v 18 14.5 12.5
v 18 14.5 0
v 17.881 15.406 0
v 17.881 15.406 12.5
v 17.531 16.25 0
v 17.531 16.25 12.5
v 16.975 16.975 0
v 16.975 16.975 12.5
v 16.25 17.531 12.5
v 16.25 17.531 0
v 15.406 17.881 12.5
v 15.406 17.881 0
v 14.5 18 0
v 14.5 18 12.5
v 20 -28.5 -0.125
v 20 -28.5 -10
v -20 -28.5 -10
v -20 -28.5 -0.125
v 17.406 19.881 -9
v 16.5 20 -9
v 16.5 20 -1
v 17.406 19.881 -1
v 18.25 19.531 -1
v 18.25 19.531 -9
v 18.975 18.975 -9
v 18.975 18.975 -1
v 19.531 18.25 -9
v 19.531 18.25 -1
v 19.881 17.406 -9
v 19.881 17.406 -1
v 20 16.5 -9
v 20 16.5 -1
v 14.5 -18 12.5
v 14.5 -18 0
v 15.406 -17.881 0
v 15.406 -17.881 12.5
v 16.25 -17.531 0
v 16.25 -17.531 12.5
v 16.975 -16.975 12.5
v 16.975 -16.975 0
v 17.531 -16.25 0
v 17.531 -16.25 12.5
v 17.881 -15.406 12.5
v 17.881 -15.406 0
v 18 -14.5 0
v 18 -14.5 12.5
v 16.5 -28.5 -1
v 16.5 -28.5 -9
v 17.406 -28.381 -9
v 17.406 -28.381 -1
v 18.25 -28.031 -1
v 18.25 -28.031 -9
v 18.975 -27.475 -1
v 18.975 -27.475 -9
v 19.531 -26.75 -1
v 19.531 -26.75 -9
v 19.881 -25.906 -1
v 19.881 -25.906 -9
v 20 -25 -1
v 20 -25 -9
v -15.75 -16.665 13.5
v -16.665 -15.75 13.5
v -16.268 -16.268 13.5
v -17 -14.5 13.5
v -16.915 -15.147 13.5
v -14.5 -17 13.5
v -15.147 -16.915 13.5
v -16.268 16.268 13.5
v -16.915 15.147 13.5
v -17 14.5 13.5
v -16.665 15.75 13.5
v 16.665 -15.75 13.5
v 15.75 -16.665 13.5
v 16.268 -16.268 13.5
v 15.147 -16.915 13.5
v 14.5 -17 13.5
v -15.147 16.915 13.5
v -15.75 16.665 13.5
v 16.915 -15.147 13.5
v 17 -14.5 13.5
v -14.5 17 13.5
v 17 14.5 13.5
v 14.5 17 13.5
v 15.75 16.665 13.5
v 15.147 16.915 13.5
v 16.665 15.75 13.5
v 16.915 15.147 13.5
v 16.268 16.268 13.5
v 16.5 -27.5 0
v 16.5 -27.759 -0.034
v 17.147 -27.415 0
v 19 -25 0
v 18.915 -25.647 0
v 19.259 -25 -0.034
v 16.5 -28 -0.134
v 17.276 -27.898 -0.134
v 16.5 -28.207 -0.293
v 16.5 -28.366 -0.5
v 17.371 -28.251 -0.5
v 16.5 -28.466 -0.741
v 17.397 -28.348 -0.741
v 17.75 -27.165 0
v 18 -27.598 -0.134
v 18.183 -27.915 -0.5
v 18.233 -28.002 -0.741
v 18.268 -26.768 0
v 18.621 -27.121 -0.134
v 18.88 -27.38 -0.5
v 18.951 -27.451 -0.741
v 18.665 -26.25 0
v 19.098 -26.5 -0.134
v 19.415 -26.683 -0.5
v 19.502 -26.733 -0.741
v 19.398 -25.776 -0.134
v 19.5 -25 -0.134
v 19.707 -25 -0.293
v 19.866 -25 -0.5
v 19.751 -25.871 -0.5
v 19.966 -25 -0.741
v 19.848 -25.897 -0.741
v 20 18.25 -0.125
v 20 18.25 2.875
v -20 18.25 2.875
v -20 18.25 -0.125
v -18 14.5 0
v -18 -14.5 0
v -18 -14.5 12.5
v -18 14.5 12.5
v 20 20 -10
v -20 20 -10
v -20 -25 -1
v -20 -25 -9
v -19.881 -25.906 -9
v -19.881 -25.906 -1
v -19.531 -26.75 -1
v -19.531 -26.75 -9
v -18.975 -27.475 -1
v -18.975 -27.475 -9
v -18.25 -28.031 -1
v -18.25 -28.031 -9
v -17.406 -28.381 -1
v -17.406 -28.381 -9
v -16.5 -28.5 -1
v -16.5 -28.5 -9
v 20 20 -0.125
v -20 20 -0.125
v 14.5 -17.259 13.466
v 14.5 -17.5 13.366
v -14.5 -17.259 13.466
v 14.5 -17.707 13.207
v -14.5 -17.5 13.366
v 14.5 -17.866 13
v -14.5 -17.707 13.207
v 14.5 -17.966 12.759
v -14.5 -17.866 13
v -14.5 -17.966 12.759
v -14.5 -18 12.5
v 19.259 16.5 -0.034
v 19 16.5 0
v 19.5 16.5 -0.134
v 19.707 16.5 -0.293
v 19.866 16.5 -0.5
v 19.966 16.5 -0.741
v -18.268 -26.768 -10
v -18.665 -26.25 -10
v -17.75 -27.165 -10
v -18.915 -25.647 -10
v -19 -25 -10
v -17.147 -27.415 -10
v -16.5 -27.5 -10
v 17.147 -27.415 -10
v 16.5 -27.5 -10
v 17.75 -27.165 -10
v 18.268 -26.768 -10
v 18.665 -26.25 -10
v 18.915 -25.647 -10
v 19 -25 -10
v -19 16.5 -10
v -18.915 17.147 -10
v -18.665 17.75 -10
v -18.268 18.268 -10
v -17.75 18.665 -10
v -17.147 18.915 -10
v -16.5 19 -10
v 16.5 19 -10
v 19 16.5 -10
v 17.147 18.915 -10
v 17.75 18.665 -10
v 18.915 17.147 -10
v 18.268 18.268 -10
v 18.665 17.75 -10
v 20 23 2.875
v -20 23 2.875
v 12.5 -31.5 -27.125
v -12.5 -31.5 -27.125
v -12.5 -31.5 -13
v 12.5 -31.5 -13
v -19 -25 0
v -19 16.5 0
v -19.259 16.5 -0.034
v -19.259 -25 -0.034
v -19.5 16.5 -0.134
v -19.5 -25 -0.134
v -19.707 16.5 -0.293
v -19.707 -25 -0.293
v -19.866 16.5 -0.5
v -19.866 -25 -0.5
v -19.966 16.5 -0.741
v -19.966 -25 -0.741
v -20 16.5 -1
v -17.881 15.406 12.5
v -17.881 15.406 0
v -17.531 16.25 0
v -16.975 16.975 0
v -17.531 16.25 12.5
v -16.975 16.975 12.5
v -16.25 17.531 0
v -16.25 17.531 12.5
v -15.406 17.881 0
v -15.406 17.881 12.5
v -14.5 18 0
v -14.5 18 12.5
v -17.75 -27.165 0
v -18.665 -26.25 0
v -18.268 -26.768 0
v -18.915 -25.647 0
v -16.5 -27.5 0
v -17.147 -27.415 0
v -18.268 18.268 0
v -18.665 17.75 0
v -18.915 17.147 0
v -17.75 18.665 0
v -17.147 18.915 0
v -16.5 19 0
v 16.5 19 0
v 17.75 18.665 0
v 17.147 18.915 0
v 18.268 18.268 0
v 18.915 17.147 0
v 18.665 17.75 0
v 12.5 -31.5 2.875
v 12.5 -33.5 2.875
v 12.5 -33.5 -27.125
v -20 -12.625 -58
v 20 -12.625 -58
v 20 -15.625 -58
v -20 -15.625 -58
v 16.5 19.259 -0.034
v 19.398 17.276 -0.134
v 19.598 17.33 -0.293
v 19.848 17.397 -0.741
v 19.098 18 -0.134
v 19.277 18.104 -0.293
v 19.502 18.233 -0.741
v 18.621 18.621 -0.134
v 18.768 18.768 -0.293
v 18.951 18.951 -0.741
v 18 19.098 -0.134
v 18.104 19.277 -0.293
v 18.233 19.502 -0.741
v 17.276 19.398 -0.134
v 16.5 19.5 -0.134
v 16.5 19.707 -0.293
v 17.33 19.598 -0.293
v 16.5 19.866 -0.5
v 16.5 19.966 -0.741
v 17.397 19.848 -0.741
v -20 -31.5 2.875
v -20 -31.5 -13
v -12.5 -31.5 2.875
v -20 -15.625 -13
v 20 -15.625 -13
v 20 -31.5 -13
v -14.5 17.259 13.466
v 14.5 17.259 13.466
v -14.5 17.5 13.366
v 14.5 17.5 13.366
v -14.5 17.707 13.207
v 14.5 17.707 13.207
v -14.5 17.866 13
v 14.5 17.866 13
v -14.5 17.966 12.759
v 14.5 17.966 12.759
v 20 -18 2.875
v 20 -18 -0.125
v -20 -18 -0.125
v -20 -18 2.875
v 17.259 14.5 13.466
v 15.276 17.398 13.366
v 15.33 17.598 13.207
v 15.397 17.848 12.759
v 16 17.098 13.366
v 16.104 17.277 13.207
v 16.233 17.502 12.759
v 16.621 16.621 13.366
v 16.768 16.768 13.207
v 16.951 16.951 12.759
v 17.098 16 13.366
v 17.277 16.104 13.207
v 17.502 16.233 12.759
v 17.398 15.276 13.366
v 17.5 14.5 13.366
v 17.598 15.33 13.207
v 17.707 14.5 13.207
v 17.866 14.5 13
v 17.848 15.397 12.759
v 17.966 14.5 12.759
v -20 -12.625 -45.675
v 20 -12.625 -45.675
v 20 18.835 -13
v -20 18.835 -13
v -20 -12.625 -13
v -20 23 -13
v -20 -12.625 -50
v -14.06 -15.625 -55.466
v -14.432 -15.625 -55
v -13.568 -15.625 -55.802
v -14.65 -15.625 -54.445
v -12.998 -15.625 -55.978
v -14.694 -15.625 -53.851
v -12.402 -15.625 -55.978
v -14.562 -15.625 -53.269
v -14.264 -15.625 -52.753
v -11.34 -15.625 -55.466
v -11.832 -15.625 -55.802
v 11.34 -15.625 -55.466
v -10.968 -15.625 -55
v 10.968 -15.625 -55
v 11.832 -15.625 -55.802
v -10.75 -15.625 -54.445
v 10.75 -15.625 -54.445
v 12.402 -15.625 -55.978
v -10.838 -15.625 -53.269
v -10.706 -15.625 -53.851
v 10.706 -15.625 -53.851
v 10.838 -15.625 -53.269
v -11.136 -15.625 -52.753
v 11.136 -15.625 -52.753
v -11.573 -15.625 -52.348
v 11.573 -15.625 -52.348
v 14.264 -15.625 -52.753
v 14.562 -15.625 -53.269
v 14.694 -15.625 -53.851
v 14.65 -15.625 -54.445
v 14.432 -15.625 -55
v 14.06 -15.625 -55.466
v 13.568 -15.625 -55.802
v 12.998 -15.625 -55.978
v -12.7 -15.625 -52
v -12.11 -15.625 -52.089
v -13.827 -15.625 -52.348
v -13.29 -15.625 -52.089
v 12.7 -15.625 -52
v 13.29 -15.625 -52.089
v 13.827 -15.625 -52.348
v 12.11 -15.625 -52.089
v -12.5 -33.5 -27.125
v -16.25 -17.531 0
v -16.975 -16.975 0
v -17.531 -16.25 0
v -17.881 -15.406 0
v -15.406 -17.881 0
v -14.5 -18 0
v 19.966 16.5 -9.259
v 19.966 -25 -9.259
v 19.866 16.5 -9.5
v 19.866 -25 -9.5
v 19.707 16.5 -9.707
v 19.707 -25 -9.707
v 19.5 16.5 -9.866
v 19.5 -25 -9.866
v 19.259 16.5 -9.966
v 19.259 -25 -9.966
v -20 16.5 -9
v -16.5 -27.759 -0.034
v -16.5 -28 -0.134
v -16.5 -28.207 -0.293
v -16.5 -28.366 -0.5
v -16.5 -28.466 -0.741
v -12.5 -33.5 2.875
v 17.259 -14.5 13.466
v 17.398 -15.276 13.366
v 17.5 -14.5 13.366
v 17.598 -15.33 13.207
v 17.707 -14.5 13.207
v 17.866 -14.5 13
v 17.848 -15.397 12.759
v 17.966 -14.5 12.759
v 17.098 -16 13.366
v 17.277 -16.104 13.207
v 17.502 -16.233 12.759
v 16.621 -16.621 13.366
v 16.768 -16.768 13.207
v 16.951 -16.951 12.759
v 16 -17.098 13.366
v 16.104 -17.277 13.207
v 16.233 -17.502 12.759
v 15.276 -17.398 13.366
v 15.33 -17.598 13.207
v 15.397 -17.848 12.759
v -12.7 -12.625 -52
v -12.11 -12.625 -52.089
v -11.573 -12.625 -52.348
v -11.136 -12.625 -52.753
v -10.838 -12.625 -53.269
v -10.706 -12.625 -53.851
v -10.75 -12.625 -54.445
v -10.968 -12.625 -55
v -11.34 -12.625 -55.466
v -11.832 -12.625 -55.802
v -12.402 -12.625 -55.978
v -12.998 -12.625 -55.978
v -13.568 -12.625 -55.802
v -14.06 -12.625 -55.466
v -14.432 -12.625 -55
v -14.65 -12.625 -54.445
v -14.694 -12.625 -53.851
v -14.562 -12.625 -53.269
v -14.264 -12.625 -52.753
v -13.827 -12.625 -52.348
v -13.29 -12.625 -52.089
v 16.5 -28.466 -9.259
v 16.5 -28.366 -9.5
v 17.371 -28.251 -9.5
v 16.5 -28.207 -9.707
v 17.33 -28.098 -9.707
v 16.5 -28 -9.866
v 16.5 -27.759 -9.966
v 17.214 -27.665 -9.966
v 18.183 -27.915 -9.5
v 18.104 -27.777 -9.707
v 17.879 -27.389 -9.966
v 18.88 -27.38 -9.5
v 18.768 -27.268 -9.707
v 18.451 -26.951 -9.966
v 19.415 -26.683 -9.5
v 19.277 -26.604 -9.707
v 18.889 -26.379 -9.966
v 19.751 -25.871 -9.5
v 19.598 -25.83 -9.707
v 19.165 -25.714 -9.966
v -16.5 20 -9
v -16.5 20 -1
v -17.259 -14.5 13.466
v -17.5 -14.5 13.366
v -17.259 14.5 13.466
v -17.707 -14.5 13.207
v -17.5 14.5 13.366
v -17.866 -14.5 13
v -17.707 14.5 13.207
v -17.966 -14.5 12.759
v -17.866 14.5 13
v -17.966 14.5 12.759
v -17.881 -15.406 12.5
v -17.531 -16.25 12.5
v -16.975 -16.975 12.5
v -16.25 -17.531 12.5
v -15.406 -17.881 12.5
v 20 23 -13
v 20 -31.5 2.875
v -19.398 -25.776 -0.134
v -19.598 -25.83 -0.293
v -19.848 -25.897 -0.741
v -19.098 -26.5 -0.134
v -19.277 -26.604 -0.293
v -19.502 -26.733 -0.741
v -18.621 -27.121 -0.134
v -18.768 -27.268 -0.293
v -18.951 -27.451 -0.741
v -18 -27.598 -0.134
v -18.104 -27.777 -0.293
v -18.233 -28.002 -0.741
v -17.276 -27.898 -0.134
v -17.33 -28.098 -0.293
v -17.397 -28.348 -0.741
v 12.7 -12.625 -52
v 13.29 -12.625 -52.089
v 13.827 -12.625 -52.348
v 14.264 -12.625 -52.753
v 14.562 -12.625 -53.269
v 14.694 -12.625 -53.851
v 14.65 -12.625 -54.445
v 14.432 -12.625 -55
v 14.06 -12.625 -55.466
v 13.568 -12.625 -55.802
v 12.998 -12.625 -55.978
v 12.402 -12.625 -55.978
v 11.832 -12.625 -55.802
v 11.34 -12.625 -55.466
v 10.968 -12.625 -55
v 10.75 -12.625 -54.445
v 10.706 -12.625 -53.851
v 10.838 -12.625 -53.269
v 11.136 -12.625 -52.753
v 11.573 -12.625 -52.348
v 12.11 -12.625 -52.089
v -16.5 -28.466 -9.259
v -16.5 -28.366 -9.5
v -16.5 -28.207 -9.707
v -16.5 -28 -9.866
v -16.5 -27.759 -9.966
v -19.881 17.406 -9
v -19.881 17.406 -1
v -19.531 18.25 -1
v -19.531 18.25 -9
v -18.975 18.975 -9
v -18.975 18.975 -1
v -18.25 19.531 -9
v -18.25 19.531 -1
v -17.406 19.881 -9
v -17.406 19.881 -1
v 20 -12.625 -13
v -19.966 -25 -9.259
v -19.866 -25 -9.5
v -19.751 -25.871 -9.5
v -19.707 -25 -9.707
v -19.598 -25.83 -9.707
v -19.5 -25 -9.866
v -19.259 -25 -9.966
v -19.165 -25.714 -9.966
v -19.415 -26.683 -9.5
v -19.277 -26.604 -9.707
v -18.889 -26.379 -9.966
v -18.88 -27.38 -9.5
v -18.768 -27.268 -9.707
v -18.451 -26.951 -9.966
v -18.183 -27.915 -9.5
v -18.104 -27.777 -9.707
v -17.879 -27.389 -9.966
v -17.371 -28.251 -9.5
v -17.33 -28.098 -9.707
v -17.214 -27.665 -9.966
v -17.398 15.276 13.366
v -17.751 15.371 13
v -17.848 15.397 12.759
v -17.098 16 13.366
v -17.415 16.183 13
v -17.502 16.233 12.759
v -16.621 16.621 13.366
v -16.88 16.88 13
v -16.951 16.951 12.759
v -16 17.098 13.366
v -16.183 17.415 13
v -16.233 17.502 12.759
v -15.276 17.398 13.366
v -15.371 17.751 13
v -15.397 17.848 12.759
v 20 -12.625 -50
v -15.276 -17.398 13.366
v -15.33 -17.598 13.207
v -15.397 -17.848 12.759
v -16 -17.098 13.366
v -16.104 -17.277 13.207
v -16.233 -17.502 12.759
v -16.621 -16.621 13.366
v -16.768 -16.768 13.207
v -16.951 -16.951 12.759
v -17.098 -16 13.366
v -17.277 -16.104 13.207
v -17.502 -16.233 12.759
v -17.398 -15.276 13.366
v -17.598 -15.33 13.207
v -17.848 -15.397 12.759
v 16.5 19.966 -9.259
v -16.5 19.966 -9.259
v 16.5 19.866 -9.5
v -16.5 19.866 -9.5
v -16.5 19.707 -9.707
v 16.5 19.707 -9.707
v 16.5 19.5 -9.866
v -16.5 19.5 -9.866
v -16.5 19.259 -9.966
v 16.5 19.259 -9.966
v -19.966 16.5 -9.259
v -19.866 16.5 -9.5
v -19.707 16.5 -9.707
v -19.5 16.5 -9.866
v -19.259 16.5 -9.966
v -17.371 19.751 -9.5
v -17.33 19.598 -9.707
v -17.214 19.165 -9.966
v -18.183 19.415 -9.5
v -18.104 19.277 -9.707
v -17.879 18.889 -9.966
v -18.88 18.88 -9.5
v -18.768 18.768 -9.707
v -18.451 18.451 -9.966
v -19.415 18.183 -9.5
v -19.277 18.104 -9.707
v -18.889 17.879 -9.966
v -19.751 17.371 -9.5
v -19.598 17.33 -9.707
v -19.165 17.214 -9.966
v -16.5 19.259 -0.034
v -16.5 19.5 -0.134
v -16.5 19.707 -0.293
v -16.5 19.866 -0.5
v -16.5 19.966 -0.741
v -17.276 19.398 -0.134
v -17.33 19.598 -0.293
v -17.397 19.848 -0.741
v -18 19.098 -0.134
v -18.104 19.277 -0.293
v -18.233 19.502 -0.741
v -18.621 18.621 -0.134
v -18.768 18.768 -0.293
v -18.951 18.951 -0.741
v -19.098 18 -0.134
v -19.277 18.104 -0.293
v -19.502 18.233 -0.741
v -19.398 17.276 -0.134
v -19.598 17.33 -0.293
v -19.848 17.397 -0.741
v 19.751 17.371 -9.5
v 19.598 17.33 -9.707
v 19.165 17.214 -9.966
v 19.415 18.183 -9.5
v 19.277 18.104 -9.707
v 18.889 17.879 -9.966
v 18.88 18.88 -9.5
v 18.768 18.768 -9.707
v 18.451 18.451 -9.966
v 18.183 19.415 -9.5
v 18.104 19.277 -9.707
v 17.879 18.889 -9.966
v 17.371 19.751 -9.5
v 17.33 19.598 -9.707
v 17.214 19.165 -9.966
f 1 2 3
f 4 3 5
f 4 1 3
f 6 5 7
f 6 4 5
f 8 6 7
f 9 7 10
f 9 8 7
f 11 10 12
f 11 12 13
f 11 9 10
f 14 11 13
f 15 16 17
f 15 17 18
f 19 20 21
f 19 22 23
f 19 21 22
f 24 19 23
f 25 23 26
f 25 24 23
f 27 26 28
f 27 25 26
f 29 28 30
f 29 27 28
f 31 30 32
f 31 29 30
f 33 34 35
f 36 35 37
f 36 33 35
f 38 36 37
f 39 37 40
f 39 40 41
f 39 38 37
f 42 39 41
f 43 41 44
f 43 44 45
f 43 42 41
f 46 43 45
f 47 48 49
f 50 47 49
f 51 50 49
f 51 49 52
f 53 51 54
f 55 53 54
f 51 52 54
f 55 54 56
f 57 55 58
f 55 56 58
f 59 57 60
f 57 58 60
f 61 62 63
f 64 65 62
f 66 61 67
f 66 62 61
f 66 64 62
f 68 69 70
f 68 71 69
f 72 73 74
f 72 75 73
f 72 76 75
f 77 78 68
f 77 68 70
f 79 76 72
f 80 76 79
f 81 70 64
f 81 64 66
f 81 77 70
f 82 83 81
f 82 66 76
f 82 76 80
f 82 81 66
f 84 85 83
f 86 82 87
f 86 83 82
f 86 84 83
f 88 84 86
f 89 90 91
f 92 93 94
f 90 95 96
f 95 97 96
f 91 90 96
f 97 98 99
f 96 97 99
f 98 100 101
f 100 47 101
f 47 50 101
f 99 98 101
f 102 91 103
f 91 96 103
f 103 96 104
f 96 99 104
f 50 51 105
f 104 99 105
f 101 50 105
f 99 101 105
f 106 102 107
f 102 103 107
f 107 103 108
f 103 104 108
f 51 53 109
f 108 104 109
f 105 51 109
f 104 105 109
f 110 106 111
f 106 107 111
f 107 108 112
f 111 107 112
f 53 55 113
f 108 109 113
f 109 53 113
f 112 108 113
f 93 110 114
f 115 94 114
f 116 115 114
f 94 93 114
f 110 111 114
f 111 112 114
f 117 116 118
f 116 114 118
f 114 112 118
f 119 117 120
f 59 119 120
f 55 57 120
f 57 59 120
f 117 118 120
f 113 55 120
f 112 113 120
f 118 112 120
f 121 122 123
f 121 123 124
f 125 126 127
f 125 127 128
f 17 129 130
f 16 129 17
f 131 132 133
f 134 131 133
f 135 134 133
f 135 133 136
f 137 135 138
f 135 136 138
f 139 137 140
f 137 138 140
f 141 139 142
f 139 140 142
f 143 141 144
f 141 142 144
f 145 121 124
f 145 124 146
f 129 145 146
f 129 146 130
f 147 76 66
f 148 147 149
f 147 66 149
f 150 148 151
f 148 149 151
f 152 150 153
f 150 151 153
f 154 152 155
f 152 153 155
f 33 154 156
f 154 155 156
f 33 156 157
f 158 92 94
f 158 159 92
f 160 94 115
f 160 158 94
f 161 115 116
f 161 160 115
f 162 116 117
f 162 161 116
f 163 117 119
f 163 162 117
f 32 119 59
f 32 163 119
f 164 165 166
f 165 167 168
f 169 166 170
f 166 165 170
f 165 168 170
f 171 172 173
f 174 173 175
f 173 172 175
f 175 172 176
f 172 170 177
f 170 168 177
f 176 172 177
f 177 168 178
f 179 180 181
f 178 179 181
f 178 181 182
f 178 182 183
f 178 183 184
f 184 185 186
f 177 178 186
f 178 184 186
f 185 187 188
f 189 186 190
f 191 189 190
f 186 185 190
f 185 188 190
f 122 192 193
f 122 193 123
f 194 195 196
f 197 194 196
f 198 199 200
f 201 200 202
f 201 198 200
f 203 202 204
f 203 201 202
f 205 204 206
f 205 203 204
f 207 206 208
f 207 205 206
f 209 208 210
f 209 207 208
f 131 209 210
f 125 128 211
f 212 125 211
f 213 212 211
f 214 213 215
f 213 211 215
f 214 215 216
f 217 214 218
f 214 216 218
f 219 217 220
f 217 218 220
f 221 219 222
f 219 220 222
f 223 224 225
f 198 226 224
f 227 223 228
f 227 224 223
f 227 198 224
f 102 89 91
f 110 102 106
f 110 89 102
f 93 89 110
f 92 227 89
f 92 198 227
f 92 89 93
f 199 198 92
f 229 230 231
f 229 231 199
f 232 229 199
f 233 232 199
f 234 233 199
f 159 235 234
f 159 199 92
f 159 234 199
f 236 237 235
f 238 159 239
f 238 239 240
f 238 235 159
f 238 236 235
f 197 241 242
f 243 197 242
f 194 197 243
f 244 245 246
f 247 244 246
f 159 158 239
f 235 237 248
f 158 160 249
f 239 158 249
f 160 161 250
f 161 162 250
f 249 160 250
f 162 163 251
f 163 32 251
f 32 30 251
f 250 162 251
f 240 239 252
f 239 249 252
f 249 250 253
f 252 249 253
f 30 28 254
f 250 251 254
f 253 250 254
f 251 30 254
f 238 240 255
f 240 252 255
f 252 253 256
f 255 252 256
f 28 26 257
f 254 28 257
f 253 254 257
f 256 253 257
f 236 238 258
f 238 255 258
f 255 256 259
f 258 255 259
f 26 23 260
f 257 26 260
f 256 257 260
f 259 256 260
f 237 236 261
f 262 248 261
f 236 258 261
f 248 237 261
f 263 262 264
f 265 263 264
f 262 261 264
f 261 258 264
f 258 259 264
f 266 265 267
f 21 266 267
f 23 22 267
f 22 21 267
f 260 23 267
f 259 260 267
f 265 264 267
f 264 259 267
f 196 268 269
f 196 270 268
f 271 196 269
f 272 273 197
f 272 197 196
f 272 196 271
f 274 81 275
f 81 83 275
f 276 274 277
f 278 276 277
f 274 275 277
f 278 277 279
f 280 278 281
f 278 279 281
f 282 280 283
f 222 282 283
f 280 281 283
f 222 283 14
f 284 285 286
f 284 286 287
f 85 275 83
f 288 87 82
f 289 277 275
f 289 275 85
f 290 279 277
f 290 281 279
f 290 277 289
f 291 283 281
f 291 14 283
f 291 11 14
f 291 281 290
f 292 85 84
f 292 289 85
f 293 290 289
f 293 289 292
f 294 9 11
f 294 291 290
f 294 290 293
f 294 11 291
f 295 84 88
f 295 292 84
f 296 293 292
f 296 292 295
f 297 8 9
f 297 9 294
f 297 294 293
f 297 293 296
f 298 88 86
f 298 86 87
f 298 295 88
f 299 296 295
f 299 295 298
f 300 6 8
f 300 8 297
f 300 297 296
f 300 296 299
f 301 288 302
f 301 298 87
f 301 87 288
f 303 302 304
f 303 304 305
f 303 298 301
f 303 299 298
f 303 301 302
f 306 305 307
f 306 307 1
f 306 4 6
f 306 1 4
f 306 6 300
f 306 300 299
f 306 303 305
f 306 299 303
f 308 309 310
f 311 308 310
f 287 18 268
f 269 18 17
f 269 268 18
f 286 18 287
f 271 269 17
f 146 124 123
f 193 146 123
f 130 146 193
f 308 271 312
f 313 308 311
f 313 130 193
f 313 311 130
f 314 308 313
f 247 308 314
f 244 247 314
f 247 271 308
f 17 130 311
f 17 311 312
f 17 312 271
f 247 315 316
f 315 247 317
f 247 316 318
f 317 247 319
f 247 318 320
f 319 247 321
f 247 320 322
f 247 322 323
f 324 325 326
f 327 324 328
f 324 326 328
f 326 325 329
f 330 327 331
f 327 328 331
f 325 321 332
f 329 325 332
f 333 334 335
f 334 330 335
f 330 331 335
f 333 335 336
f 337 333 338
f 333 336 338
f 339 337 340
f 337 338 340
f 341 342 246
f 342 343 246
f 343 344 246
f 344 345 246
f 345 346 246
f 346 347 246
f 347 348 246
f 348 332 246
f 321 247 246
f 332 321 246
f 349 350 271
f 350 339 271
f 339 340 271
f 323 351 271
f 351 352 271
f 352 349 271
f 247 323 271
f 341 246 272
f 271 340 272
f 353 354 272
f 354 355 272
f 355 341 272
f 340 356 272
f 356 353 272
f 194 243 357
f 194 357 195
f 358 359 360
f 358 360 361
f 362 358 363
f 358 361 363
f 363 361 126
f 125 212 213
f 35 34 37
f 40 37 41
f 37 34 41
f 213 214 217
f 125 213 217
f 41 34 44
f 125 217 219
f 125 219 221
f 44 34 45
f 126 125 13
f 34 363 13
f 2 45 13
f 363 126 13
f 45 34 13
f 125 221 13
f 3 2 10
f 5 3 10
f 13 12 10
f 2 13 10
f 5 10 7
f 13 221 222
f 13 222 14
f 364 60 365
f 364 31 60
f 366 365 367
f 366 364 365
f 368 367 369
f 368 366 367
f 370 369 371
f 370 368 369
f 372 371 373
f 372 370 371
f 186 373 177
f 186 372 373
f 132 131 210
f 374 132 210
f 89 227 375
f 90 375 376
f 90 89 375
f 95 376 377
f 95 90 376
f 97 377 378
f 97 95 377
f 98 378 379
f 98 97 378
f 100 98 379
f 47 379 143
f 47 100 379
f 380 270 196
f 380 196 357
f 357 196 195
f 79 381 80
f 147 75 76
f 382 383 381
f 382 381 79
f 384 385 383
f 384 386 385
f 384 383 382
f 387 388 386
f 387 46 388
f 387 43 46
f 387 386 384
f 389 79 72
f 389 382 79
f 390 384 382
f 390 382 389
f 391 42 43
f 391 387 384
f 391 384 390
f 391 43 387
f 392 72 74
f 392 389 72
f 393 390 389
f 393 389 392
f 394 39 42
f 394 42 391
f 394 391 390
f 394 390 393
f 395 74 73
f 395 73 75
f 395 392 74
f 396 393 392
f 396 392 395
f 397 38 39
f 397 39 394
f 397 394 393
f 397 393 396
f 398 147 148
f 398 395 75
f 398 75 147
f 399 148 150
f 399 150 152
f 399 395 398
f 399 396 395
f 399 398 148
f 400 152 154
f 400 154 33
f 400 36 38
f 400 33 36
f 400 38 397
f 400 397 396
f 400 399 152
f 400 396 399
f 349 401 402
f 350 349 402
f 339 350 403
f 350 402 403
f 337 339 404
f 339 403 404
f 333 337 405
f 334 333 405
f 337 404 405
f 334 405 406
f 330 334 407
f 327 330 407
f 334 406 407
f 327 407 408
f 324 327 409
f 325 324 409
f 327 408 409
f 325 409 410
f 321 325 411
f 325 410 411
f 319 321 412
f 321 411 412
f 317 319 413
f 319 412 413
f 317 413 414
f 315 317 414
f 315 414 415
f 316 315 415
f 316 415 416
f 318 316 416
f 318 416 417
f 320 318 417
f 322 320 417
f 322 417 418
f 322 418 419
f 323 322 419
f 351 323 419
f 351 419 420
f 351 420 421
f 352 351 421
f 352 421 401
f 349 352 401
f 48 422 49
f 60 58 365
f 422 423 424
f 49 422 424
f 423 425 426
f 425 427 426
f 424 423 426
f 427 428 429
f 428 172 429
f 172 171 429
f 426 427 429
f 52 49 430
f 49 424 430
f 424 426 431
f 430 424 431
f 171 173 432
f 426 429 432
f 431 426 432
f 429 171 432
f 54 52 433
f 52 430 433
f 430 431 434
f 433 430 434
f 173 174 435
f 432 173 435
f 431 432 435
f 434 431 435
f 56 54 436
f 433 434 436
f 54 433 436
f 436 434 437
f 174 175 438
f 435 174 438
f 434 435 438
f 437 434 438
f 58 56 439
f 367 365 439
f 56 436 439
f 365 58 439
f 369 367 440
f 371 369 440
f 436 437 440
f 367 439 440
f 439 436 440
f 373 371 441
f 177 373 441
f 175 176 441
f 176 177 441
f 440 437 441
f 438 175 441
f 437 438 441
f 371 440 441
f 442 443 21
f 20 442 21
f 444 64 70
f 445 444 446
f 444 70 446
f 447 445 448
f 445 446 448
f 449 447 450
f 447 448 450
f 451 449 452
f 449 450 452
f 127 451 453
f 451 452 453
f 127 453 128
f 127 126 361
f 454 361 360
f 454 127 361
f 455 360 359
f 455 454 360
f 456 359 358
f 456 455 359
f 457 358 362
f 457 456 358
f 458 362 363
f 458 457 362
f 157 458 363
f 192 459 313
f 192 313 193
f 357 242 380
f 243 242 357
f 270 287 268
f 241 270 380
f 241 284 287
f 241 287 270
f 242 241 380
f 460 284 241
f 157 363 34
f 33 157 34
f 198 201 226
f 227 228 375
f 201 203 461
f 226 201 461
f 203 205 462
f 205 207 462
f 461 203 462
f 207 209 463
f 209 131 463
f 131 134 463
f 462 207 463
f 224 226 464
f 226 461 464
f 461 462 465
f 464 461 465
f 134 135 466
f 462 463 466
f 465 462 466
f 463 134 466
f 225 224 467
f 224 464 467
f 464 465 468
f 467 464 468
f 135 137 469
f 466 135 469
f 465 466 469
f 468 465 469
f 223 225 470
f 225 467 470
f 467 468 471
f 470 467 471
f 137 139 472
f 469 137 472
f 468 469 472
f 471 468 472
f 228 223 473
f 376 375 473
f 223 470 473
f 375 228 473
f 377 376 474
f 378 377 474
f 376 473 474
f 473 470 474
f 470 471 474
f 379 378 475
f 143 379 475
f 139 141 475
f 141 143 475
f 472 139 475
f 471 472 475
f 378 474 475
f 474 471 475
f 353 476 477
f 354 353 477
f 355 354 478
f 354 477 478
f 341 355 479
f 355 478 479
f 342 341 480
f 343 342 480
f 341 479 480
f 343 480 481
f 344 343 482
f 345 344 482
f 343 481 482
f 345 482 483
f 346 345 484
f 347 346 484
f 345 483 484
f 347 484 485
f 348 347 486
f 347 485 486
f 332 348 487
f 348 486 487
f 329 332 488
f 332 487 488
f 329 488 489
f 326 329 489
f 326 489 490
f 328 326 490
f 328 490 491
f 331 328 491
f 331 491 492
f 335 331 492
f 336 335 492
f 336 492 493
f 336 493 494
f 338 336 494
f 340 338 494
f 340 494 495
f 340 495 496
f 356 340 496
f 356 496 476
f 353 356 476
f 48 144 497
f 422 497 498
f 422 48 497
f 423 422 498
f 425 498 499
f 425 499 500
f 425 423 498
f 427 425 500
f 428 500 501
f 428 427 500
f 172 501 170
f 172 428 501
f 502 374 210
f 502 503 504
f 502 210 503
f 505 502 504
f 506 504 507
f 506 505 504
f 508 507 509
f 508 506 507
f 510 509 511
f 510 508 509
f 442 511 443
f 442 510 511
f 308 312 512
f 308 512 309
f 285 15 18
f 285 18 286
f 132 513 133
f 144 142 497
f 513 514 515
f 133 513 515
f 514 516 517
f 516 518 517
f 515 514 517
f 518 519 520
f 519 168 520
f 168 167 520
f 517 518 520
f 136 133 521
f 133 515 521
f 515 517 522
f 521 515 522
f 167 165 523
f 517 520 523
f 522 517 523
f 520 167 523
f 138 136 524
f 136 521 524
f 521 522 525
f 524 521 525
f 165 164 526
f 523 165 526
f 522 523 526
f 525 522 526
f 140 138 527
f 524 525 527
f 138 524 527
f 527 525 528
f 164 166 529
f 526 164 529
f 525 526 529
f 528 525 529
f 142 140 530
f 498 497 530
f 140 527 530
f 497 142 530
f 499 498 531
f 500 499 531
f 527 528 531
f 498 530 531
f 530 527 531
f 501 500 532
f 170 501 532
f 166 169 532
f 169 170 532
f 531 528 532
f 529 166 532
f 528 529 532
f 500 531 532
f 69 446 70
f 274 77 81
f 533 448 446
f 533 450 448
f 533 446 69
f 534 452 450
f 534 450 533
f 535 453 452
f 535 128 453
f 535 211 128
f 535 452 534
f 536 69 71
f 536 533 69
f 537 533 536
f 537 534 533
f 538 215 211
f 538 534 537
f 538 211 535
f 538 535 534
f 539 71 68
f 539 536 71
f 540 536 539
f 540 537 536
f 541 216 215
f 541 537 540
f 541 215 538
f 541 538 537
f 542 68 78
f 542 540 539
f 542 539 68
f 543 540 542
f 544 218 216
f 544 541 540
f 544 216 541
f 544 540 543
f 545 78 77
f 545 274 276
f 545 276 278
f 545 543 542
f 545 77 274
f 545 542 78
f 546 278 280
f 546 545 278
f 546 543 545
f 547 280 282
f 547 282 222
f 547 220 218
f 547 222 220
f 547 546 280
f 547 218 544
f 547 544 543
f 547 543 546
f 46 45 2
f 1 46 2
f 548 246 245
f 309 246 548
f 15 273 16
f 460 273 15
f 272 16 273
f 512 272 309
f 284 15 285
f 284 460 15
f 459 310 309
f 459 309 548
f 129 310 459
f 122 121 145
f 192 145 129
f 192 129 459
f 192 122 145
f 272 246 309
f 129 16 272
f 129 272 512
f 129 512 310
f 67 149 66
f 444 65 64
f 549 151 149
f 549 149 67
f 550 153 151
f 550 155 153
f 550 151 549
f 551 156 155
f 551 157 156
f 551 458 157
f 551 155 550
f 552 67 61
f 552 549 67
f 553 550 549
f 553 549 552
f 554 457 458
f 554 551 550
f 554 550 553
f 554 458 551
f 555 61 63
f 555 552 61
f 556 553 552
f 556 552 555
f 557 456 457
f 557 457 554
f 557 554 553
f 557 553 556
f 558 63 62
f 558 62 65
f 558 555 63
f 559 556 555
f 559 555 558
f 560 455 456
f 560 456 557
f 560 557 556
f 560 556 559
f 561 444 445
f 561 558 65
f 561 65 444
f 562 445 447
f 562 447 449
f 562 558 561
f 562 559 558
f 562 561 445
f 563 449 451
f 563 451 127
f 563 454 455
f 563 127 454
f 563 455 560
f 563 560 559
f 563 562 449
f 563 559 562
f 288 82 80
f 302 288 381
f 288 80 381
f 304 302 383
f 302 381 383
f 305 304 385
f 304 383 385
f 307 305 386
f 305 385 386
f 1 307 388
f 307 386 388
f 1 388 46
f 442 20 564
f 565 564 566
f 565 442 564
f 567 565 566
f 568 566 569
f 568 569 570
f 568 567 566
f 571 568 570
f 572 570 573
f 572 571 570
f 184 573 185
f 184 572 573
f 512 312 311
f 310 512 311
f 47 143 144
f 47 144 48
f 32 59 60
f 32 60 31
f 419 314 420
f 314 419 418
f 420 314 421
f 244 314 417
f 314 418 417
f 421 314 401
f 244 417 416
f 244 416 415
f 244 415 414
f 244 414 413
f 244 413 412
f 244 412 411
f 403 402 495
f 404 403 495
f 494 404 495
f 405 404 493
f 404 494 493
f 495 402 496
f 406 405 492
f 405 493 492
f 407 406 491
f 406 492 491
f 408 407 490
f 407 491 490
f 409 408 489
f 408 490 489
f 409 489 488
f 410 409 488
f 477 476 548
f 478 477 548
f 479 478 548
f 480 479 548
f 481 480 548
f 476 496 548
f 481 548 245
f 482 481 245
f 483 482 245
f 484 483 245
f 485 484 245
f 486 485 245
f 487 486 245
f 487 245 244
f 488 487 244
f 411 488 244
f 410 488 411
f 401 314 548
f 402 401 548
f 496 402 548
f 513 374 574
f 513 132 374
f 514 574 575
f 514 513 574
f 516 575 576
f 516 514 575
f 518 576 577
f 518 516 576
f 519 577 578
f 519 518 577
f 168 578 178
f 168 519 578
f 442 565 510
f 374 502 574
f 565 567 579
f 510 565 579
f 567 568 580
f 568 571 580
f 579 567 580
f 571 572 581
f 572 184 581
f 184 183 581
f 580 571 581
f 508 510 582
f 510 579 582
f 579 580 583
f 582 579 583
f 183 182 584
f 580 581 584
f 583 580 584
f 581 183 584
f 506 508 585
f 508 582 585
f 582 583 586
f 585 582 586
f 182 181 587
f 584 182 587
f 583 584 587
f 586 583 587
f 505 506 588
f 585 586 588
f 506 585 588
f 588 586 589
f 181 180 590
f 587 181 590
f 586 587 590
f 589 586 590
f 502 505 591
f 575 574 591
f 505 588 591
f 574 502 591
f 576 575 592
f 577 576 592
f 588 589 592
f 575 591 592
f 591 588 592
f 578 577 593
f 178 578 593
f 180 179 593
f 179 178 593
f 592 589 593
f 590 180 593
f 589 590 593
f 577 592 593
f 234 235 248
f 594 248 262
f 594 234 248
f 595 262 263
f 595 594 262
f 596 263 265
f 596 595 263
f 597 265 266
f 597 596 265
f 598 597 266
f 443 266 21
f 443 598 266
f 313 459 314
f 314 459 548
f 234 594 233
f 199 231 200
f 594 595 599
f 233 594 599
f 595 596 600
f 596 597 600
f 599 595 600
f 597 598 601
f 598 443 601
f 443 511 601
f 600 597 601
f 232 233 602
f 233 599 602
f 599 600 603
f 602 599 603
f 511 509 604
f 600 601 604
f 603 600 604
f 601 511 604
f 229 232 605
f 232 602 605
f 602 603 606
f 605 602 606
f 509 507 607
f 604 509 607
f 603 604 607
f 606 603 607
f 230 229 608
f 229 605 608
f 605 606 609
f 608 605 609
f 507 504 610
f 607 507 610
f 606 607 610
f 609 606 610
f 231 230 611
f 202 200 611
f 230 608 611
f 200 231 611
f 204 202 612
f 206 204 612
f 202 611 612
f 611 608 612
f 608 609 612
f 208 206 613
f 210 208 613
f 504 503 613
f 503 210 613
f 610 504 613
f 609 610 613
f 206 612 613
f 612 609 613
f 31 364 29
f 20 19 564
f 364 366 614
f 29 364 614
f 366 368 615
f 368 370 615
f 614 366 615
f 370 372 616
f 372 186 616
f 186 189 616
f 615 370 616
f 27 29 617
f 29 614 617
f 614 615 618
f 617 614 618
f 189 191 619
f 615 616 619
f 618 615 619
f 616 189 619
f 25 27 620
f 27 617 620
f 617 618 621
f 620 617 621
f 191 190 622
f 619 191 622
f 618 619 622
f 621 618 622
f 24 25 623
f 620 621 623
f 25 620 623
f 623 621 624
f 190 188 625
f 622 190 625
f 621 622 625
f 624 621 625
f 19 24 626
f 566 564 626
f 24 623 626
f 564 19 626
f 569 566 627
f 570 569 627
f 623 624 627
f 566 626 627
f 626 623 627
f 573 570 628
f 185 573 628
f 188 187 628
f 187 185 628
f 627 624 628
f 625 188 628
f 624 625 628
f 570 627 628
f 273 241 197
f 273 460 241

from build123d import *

# Parameters (mm, degrees)
SKETCH1_W                       = 36
SKETCH1_H                       = 36
BOSS_EXTRUDE1_DEPTH             = 13.5
SKETCH1_3_W                     = 40
SKETCH1_3_H                     = 48.5
SKETCH1_3_W_2                   = 36
SKETCH1_3_H_2                   = 36
BOSS_EXTRUDE2_DEPTH             = 10
FILLET1_R                       = 3.5
FILLET2_R                       = 3.5
FILLET3_R                       = 1
FILLET4_R                       = 1
FILLET5_R                       = 1
BOSS_EXTRUDE3_REACH             = 39.343
BOSS_EXTRUDE3_DIRECTION_2_REACH = 39.343
BOSS_EXTRUDE4_REACH             = 41.68
BOSS_EXTRUDE4_DIRECTION_2_REACH = 41.68
BOSS_EXTRUDE5_DEPTH             = 12.5
SKETCH9_R                       = 2
CUT_EXTRUDE3_DEPTH              = 71.944630699


with BuildPart() as part:
    # Sketch1 → Boss-Extrude1 (new body)
    with BuildSketch(Plane.XY):
        Rectangle(SKETCH1_W, SKETCH1_H)
    extrude(amount=BOSS_EXTRUDE1_DEPTH)

    # Fillet2
    fillet2_edges = [part.edges().sort_by_distance(p)[0] for p in [
        (-18, 18, 6.75),
        (-18, -18, 6.75),
        (18, -18, 6.75),
        (18, 18, 6.75),
    ]]
    fillet(fillet2_edges, radius=FILLET2_R)

    # Fillet5
    fillet5_edges = [part.edges().sort_by_distance(p)[0] for p in [
        (0, 18, 13.5),
        (18, 0, 13.5),
        (-18, 0, 13.5),
        (0, -18, 13.5),
        (-16.974873734, 16.974873734, 13.5),
        (-16.974873734, -16.974873734, 13.5),
        (16.974873734, -16.974873734, 13.5),
        (16.974873734, 16.974873734, 13.5),
    ]]
    fillet(fillet5_edges, radius=FILLET5_R)


with BuildPart() as body_2:
    # Sketch1<3> → Boss-Extrude2 (new body)
    # profile 1 of 2: a face of its own
    with BuildSketch(Plane.XY):
        with Locations((0, -4.25)):
            Rectangle(SKETCH1_3_W, SKETCH1_3_H)
        Rectangle(SKETCH1_3_W_2, SKETCH1_3_H_2, mode=Mode.SUBTRACT)
    # profile 2 of 2: a face of its own
    with BuildSketch(Plane.XY):
        Rectangle(SKETCH1_3_W_2, SKETCH1_3_H_2)
    extrude(amount=-BOSS_EXTRUDE2_DEPTH)

    # Fillet1
    fillet1_edges = [body_2.edges().sort_by_distance(p)[0] for p in [
        (20, -28.5, -5),
        (-20, -28.5, -5),
        (-20, 20, -5),
        (20, 20, -5),
    ]]
    fillet(fillet1_edges, radius=FILLET1_R)

    # Fillet3
    fillet3_edges = [body_2.edges().sort_by_distance(p)[0] for p in [
        (20, -4.25, 0),
        (0, 20, 0),
        (-20, -4.25, 0),
        (0, -28.5, 0),
        (-18.974873734, 18.974873734, 0),
        (18.974873734, -27.474873734, 0),
        (-18.974873734, -27.474873734, 0),
        (18.974873734, 18.974873734, 0),
    ]]
    fillet(fillet3_edges, radius=FILLET3_R)

    # Fillet4
    fillet4_edges = [body_2.edges().sort_by_distance(p)[0] for p in [
        (20, -4.25, -10),
        (0, 20, -10),
        (0, -28.5, -10),
        (-20, -4.25, -10),
        (-18.974873734, 18.974873734, -10),
        (18.974873734, -27.474873734, -10),
        (-18.974873734, -27.474873734, -10),
        (18.974873734, 18.974873734, -10),
    ]]
    fillet(fillet4_edges, radius=FILLET4_R)


with BuildPart() as body_3:

    # Boss-Extrude3: up to this face of the body (flat: up to its plane)
    boss_extrude3_end = Plane(body_2.part.faces().sort_by_distance((20, -4.25, -5))[0])
    # Sketch2 → Boss-Extrude3 (new, up to the picked face)
    with BuildSketch(Plane(origin=(0, 0, 0), x_dir=(0, 0, -1), z_dir=(1, 0, 0)), mode=Mode.PRIVATE) as boss_extrude3_sk1:
        Polygon((-2.875, -18), (-2.875, -31.5), (13, -31.5), (13, 20), (13, 23), (-2.875, 23), (-2.875, 18.25), (0.125, 18.25), (0.125, 20), (10, 20), (10, -28.5), (0.125, -28.5), (0.125, -18), align=None)
    boss_extrude3_tool1 = split(extrude(boss_extrude3_sk1.sketch, amount=BOSS_EXTRUDE3_REACH, mode=Mode.PRIVATE), bisect_by=boss_extrude3_end, keep=Keep.BOTH, mode=Mode.PRIVATE)
    add(boss_extrude3_tool1.solids().sort_by(Axis((0, -24.75, 2.30735), (1, 0, 0)))[0])


    # Boss-Extrude3 direction 2: up to this face of the body (flat: up to its plane)
    boss_extrude3_direction_2_end = Plane(body_2.part.faces().sort_by_distance((-20, -4.25, -5))[0])
    # Sketch2 → Boss-Extrude3 direction 2 (add, up to the picked face)
    with BuildSketch(Plane(origin=(0, 0, 0), x_dir=(0, 0, -1), z_dir=(1, 0, 0)), mode=Mode.PRIVATE) as boss_extrude3_direction_2_sk1:
        Polygon((-2.875, -18), (-2.875, -31.5), (13, -31.5), (13, 20), (13, 23), (-2.875, 23), (-2.875, 18.25), (0.125, 18.25), (0.125, 20), (10, 20), (10, -28.5), (0.125, -28.5), (0.125, -18), align=None)
    boss_extrude3_direction_2_tool1 = split(extrude(boss_extrude3_direction_2_sk1.sketch, amount=-BOSS_EXTRUDE3_DIRECTION_2_REACH, mode=Mode.PRIVATE), bisect_by=boss_extrude3_direction_2_end, keep=Keep.BOTH, mode=Mode.PRIVATE)
    add(boss_extrude3_direction_2_tool1.solids().sort_by(Axis((0, -24.75, 2.30735), (-1, 0, 0)))[0])


    # Boss-Extrude4: up to this face of the body (flat: up to its plane)
    boss_extrude4_end = Plane(body_2.part.faces().sort_by_distance((20, -4.25, -5))[0])
    # Sketch3 → Boss-Extrude4 (add, up to the picked face)
    with BuildSketch(Plane(origin=(0, 0, 0), x_dir=(0, 0, -1), z_dir=(1, 0, 0)), mode=Mode.PRIVATE) as boss_extrude4_sk1:
        Polygon((58, -15.625), (10, -15.625), (10, 23), (13, 23), (50, -12.625), (58, -12.625), align=None)
        Polygon((13, 18.835445964), (13, -12.625), (45.674708791, -12.625), align=None, mode=Mode.SUBTRACT)
    boss_extrude4_tool1 = split(extrude(boss_extrude4_sk1.sketch, amount=BOSS_EXTRUDE4_REACH, mode=Mode.PRIVATE), bisect_by=boss_extrude4_end, keep=Keep.BOTH, mode=Mode.PRIVATE)
    add(boss_extrude4_tool1.solids().sort_by(Axis((0, -15.008892, -34), (1, 0, 0)))[0])


    # Boss-Extrude4 direction 2: up to this face of the body (flat: up to its plane)
    boss_extrude4_direction_2_end = Plane(body_2.part.faces().sort_by_distance((-20, -4.25, -5))[0])
    # Sketch3 → Boss-Extrude4 direction 2 (add, up to the picked face)
    with BuildSketch(Plane(origin=(0, 0, 0), x_dir=(0, 0, -1), z_dir=(1, 0, 0)), mode=Mode.PRIVATE) as boss_extrude4_direction_2_sk1:
        Polygon((58, -15.625), (10, -15.625), (10, 23), (13, 23), (50, -12.625), (58, -12.625), align=None)
        Polygon((13, 18.835445964), (13, -12.625), (45.674708791, -12.625), align=None, mode=Mode.SUBTRACT)
    boss_extrude4_direction_2_tool1 = split(extrude(boss_extrude4_direction_2_sk1.sketch, amount=-BOSS_EXTRUDE4_DIRECTION_2_REACH, mode=Mode.PRIVATE), bisect_by=boss_extrude4_direction_2_end, keep=Keep.BOTH, mode=Mode.PRIVATE)
    add(boss_extrude4_direction_2_tool1.solids().sort_by(Axis((0, -15.008892, -34), (-1, 0, 0)))[0])

    # Sketch8 → Boss-Extrude5 (add, symmetric)
    with BuildSketch(Plane(origin=(0, 0, 0), x_dir=(0, 0, -1), z_dir=(1, 0, 0))):
        Polygon((-2.875, -31.5), (-2.875, -33.5), (27.125, -33.5), (27.125, -31.5), (13, -31.5), align=None)
    extrude(amount=BOSS_EXTRUDE5_DEPTH, both=True)

    # Sketch9 → Cut-Extrude3 (cut, through all)
    with BuildSketch(Plane(origin=(0, -12.625, 0), x_dir=(1, 0, 0), z_dir=(0, 1, 0))):
        with Locations(Location((12.7, 54, 0), (0, 0, 270))):
            Circle(SKETCH9_R)
        with Locations(Location((-12.7, 54, 0), (0, 0, 270))):
            Circle(SKETCH9_R)
    extrude(amount=-CUT_EXTRUDE3_DEPTH, mode=Mode.SUBTRACT)


solid = Compound([part.part, body_2.part, body_3.part])
